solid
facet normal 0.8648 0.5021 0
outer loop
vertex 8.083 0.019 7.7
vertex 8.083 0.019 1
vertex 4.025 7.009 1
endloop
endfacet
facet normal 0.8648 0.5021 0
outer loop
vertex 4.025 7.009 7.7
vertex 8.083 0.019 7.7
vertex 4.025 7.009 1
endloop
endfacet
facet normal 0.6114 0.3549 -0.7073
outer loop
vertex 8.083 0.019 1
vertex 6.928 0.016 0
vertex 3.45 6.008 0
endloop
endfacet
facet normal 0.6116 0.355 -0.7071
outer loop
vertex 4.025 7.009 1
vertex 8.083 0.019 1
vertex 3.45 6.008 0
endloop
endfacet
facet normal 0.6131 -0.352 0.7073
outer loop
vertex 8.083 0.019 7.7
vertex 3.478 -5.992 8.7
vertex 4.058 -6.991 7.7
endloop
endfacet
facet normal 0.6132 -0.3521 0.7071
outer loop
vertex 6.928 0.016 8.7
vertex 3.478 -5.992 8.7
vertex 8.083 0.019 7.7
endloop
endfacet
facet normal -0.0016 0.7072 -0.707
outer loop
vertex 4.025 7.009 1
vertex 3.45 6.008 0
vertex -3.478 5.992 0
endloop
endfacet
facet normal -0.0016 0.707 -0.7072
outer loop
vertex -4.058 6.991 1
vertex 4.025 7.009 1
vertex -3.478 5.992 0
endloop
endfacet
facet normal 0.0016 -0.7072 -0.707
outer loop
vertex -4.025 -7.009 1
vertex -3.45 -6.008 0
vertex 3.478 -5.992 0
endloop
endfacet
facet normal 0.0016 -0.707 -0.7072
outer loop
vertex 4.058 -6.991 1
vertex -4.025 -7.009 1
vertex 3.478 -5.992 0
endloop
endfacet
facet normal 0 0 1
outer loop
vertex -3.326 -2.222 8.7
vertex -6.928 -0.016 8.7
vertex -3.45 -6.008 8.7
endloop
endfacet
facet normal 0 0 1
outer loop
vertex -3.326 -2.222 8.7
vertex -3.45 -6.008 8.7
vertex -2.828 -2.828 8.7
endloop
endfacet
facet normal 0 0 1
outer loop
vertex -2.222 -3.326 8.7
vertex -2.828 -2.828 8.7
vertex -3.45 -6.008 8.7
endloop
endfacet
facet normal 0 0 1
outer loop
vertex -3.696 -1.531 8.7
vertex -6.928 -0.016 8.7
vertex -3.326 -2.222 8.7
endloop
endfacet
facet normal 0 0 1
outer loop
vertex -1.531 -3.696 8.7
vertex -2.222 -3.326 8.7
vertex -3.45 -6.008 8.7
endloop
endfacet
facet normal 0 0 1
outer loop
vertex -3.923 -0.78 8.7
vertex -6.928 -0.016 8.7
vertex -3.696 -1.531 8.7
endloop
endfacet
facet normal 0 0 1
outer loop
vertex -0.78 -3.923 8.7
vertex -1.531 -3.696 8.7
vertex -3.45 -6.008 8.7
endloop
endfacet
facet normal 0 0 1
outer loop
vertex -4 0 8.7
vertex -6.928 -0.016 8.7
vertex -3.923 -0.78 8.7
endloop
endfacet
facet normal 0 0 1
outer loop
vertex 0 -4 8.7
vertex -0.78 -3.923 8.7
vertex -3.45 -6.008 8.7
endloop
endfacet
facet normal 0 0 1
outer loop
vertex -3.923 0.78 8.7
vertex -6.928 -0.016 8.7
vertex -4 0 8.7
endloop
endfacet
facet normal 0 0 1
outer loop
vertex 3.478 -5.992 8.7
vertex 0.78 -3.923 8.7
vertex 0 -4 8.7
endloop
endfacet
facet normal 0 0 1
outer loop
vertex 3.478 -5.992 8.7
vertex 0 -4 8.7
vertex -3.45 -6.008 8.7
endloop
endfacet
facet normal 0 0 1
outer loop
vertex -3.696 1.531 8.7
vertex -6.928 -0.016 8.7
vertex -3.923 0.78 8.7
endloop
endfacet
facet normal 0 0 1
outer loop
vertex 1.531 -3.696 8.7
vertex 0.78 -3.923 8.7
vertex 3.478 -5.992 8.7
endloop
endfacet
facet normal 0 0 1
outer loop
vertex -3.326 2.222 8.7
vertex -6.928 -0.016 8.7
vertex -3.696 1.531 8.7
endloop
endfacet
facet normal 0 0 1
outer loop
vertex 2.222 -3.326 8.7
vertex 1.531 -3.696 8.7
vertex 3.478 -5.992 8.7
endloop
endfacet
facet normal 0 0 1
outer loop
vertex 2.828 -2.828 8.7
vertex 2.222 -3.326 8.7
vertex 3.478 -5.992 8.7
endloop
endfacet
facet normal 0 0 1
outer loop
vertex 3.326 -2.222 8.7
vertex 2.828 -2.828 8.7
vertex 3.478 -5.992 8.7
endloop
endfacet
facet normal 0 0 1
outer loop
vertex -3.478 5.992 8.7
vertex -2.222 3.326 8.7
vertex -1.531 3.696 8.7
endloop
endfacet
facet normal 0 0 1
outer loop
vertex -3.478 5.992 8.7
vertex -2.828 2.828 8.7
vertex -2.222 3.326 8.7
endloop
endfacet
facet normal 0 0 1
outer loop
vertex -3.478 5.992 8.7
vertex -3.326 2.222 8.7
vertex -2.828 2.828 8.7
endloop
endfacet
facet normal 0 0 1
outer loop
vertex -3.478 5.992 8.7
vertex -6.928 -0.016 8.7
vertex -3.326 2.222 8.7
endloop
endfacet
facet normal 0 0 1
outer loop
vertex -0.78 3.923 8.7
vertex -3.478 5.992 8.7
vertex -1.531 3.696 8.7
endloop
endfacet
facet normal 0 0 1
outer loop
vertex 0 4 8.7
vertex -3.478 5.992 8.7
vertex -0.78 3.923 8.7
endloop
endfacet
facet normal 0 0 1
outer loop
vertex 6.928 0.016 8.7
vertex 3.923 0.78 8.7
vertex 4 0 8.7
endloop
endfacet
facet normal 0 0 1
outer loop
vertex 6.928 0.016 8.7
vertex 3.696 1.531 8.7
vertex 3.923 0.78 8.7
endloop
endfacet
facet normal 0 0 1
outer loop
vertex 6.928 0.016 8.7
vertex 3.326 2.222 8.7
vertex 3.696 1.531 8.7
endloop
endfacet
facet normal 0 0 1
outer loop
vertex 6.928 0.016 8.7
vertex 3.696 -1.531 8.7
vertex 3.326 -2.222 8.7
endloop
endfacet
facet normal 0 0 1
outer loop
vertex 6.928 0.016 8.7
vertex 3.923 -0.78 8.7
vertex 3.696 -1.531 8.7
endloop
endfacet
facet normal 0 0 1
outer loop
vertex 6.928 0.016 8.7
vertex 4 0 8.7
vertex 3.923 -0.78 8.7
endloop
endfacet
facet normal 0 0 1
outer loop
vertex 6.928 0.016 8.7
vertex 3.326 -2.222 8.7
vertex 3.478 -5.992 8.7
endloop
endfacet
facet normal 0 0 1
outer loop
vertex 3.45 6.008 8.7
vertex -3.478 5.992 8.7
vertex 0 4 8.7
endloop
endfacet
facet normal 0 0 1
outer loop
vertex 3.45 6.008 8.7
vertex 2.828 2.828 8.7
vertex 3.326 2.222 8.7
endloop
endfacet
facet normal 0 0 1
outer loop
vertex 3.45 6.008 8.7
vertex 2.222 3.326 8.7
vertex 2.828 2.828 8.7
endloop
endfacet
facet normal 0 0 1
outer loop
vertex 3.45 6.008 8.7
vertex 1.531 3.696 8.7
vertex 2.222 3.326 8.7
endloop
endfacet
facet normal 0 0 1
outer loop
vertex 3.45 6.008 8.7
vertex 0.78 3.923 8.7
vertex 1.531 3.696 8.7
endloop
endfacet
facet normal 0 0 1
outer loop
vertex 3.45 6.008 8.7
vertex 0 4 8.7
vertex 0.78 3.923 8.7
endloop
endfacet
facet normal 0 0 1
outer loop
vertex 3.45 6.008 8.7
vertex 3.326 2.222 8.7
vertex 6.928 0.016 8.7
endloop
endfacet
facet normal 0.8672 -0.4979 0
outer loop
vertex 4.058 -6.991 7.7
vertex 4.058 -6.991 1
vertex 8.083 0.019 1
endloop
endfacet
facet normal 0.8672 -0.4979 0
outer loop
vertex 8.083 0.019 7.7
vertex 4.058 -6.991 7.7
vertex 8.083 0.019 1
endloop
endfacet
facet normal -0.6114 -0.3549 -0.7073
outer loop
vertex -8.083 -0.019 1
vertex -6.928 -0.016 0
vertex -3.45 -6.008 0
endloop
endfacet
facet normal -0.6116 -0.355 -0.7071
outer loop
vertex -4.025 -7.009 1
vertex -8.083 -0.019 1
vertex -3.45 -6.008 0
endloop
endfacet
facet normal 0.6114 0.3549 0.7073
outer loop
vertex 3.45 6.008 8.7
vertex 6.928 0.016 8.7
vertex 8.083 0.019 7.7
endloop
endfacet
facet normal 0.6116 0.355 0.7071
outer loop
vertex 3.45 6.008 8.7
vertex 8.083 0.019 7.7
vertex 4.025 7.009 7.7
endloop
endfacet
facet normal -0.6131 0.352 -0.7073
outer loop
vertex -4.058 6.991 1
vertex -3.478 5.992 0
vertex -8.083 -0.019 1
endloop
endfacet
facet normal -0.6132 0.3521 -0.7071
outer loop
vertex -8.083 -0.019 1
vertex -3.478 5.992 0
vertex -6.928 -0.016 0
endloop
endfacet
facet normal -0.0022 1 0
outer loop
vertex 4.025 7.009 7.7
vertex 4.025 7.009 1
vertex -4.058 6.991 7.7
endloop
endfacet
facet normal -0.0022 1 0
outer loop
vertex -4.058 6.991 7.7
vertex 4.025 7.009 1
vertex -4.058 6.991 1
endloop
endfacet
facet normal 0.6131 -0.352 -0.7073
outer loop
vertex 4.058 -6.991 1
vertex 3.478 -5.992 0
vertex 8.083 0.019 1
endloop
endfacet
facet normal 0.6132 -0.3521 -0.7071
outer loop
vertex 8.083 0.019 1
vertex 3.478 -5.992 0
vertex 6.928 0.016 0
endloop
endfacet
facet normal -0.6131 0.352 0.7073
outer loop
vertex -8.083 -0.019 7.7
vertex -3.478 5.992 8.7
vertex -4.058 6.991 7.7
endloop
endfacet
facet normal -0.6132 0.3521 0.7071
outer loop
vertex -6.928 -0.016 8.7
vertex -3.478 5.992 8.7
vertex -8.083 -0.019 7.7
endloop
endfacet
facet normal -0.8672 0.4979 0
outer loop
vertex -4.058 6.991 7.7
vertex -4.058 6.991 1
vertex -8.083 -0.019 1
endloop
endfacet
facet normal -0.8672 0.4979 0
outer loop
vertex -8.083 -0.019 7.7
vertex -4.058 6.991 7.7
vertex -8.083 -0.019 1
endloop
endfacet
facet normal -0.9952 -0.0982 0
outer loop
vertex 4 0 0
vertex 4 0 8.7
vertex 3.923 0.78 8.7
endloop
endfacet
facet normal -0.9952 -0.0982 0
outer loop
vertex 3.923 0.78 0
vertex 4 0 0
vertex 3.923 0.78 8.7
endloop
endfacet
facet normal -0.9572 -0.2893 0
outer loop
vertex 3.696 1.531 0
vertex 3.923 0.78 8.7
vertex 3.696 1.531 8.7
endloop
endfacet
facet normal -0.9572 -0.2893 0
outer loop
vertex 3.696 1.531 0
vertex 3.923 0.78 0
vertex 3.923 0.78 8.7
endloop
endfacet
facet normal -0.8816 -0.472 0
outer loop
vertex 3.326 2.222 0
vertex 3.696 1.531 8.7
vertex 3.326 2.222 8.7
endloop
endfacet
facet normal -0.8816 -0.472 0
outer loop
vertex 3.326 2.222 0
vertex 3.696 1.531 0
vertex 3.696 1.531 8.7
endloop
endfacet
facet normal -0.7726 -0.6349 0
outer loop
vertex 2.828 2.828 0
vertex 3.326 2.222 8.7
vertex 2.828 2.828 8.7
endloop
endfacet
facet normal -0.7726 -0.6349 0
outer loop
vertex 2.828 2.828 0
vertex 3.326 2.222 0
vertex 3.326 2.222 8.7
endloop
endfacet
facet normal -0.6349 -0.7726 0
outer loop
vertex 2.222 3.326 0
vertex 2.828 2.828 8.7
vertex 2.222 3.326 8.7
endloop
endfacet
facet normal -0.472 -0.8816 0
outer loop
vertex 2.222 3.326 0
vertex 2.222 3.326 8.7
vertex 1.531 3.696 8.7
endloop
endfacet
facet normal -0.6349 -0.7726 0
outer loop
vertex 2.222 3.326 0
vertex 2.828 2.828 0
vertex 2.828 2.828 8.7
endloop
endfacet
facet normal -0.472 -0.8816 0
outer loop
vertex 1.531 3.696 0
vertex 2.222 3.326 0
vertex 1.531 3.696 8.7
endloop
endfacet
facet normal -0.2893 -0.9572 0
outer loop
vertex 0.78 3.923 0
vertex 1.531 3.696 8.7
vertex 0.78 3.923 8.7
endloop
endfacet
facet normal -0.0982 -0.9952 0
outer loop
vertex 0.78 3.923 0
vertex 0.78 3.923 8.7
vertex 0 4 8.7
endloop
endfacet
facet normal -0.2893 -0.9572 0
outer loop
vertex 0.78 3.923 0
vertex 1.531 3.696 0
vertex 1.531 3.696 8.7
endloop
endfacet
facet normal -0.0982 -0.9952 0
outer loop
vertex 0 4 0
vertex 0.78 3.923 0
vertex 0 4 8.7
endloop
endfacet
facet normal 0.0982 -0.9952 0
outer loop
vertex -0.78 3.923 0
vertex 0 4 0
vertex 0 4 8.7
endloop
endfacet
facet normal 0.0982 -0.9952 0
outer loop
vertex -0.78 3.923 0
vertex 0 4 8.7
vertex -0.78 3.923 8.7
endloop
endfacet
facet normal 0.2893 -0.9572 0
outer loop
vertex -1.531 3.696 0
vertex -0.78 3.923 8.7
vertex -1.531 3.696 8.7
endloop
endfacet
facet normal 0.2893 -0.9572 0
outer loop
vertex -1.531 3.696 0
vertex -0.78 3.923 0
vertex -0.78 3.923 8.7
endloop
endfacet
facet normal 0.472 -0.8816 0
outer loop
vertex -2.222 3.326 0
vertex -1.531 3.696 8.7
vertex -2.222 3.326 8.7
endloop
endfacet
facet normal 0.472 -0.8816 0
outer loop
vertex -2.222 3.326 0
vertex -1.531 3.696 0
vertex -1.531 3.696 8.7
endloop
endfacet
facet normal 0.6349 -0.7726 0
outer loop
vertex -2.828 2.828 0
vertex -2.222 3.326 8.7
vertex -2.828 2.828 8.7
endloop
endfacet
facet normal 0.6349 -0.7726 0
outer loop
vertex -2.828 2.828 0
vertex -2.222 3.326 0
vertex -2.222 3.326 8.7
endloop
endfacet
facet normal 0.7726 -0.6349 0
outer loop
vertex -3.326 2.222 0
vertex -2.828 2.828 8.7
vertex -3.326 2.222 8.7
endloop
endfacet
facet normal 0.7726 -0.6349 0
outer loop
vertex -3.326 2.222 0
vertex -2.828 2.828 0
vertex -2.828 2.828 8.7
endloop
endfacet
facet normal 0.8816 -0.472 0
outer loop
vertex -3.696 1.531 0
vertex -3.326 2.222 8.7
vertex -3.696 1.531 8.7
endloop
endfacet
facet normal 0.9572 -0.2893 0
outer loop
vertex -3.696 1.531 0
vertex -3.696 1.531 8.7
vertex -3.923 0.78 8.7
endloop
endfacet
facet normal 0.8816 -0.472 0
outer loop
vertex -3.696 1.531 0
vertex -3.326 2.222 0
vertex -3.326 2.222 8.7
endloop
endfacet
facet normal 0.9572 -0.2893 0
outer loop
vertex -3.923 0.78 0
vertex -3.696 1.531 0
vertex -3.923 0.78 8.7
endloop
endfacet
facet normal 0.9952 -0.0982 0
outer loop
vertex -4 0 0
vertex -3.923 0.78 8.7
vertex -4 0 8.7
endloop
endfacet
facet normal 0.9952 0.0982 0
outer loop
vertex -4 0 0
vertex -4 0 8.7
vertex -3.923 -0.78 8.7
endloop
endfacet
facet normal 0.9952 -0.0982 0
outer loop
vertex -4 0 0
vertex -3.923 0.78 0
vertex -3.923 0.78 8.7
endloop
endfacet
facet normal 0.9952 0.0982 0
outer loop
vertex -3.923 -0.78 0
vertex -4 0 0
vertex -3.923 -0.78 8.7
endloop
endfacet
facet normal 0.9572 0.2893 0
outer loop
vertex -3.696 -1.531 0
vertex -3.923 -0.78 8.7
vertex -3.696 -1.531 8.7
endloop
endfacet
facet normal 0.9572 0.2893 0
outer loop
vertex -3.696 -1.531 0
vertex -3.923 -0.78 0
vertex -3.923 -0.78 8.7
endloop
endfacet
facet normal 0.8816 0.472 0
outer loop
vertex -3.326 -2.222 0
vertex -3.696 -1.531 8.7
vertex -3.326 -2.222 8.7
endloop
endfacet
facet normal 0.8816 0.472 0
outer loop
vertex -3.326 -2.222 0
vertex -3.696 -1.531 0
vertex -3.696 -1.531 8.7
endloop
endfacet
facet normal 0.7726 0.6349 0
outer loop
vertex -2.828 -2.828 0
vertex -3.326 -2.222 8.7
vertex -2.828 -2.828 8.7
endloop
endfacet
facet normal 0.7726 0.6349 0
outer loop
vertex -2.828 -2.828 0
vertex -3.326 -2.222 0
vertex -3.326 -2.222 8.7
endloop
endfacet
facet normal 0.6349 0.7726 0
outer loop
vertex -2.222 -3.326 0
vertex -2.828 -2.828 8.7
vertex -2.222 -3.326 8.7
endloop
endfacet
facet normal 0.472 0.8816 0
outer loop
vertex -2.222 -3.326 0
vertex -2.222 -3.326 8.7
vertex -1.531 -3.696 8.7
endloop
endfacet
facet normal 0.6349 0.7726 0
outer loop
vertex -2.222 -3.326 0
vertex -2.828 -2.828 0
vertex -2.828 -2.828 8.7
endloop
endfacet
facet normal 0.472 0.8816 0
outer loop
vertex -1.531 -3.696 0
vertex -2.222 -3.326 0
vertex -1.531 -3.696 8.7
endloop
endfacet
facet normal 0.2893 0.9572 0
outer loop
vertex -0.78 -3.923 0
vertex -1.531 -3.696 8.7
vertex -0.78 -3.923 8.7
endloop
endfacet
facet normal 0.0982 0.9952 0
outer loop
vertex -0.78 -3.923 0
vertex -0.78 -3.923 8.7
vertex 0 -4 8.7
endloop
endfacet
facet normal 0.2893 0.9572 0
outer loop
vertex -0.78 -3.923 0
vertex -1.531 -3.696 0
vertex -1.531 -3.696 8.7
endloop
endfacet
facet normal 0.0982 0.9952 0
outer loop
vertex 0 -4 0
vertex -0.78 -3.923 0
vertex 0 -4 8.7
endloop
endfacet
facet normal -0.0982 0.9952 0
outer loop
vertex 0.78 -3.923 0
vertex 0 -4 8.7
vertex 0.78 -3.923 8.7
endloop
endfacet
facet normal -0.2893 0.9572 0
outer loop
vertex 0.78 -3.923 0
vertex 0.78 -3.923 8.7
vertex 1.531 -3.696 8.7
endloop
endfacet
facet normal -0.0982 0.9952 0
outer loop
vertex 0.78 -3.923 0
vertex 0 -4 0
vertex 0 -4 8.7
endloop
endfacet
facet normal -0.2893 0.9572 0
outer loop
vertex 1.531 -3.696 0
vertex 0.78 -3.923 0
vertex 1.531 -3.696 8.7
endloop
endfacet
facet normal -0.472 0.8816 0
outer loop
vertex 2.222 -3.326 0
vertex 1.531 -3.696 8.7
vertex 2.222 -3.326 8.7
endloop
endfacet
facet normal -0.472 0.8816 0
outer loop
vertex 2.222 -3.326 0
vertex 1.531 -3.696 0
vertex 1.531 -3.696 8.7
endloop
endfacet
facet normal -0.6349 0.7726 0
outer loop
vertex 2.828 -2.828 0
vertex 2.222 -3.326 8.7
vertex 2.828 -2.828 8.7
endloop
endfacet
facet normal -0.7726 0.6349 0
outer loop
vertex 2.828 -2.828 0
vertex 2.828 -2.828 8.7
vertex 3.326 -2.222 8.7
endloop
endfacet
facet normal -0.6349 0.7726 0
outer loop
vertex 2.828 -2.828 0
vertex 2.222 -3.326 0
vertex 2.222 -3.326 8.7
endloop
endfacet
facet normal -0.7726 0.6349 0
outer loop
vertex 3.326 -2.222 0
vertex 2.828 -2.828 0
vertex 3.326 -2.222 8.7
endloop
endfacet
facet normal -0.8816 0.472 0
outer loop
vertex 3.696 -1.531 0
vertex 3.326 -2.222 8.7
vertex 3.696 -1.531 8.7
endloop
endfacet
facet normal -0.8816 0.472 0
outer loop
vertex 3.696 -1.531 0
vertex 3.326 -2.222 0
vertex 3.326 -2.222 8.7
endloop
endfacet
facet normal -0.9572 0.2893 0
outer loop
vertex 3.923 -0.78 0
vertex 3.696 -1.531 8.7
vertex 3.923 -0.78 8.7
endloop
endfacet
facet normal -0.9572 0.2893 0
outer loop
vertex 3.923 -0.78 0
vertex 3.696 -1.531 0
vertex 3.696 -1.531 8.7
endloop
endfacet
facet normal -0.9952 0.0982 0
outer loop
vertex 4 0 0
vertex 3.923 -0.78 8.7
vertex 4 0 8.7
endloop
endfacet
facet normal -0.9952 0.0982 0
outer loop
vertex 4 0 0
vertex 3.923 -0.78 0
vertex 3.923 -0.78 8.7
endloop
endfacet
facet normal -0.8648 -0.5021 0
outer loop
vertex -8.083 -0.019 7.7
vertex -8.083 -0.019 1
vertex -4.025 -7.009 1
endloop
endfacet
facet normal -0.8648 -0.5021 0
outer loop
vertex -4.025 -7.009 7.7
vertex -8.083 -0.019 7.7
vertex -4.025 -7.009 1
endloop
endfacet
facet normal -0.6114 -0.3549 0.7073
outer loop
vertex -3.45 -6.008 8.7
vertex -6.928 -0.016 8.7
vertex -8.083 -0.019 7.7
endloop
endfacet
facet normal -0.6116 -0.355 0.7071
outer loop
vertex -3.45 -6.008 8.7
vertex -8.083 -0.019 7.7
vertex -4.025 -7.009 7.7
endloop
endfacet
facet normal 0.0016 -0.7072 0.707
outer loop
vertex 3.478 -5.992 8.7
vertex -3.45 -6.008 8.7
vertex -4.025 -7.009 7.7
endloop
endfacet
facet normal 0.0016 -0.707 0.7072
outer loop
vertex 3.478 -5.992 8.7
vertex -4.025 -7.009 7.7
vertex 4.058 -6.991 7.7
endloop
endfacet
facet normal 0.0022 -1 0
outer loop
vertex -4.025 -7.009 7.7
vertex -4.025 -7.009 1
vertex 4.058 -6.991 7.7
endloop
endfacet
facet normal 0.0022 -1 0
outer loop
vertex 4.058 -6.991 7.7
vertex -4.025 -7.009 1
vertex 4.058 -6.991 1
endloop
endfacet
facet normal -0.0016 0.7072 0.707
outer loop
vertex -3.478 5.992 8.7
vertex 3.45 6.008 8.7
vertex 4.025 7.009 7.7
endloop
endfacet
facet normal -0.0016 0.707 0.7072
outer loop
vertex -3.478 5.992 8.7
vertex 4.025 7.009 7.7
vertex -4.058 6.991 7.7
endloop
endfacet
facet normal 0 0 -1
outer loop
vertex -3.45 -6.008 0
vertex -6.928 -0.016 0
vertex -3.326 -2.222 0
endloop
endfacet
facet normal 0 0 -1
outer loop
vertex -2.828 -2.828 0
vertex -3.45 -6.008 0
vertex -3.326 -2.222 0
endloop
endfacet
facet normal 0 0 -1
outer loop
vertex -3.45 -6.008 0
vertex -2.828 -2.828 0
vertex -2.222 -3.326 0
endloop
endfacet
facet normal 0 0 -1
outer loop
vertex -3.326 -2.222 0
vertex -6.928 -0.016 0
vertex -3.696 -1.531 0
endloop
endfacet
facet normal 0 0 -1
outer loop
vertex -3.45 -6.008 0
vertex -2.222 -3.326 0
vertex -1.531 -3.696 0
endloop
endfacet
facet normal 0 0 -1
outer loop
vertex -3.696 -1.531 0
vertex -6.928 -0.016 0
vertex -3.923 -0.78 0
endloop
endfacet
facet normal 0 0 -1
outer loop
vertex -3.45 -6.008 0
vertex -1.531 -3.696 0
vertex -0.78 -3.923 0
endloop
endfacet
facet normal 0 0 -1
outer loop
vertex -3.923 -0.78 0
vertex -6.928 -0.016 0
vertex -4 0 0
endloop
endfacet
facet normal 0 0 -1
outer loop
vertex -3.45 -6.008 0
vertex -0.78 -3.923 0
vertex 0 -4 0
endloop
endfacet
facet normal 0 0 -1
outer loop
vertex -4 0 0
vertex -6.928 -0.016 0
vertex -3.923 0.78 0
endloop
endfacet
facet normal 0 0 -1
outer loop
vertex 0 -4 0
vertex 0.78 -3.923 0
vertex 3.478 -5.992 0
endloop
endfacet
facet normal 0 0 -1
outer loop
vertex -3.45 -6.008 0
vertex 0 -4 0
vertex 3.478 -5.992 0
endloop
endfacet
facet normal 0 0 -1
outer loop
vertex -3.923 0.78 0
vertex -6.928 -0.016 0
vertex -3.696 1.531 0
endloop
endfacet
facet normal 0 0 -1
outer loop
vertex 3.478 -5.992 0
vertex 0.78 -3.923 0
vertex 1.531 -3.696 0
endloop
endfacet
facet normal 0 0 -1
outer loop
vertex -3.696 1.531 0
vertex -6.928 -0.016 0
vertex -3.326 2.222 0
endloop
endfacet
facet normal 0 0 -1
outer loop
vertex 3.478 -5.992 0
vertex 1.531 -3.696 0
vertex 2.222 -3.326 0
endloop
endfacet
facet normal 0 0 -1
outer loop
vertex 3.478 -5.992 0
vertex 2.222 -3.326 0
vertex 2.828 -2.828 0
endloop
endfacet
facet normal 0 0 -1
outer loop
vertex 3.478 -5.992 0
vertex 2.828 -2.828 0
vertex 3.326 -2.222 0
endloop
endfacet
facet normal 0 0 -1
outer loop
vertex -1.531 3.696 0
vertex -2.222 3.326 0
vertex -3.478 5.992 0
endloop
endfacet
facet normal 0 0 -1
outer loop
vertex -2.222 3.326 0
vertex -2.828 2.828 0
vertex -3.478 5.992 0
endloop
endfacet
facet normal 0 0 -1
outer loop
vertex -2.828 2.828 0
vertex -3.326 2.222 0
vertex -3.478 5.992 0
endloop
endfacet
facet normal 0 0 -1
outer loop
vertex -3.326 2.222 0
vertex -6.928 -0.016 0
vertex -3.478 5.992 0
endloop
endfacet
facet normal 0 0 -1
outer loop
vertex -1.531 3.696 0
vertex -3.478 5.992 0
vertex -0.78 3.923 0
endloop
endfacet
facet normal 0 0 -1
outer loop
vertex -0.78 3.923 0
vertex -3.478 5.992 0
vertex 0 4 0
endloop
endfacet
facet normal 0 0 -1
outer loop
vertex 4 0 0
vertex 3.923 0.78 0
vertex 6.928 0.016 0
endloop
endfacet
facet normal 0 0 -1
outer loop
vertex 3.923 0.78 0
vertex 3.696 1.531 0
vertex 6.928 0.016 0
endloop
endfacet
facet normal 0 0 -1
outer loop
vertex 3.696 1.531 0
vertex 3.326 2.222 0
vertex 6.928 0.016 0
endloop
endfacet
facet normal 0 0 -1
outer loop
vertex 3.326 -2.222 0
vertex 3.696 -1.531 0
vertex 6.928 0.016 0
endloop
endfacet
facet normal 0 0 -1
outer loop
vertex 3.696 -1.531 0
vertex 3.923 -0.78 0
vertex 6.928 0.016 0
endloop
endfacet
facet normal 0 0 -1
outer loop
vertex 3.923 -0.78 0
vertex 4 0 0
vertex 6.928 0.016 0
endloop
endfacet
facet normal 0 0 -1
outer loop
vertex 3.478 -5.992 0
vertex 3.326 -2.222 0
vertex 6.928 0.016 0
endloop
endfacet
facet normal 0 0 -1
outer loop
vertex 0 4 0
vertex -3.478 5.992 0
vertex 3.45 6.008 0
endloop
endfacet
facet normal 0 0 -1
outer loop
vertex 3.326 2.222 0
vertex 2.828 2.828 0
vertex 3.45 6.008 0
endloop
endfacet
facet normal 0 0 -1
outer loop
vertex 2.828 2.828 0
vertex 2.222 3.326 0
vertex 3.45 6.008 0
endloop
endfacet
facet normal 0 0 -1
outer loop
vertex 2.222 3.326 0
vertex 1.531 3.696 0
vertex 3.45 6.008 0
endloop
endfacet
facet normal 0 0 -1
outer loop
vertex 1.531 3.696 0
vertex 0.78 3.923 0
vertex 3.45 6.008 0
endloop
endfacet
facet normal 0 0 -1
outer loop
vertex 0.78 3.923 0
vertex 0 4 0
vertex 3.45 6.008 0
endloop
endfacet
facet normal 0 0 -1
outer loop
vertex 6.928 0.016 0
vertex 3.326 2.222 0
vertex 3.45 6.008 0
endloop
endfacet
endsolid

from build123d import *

# Parameters (mm, degrees)
F0_R     = 4
F1_DEPTH = 8.7
F2_SIZE  = 1


with BuildPart() as f1:
    # F0 (on Top) → F1 (new body)
    with BuildSketch(Plane.XY):
        Polygon((4.057701, -6.990594), (8.082882, 0.018775), (4.025181, 7.009369), (-4.057701, 6.990594), (-8.082882, -0.018775), (-4.025181, -7.009369), align=None)
        Circle(F0_R, mode=Mode.SUBTRACT)
    extrude(amount=F1_DEPTH)

    # F2
    f2_edges = [f1.edges().sort_by_distance(p)[0] for p in [
        (-6.070291, 3.485909, 8.7),
        (-6.054032, -3.514072, 8.7),
        (0.01626, -6.999981, 8.7),
        (6.070291, -3.485909, 8.7),
        (6.054032, 3.514072, 8.7),
        (-0.01626, 6.999981, 8.7),
        (-6.070291, 3.485909, 0),
        (-0.01626, 6.999981, 0),
        (-6.054032, -3.514072, 0),
        (0.01626, -6.999981, 0),
        (6.070291, -3.485909, 0),
        (6.054032, 3.514072, 0),
    ]]
    chamfer(f2_edges, length=F2_SIZE)


solid = f1.part
